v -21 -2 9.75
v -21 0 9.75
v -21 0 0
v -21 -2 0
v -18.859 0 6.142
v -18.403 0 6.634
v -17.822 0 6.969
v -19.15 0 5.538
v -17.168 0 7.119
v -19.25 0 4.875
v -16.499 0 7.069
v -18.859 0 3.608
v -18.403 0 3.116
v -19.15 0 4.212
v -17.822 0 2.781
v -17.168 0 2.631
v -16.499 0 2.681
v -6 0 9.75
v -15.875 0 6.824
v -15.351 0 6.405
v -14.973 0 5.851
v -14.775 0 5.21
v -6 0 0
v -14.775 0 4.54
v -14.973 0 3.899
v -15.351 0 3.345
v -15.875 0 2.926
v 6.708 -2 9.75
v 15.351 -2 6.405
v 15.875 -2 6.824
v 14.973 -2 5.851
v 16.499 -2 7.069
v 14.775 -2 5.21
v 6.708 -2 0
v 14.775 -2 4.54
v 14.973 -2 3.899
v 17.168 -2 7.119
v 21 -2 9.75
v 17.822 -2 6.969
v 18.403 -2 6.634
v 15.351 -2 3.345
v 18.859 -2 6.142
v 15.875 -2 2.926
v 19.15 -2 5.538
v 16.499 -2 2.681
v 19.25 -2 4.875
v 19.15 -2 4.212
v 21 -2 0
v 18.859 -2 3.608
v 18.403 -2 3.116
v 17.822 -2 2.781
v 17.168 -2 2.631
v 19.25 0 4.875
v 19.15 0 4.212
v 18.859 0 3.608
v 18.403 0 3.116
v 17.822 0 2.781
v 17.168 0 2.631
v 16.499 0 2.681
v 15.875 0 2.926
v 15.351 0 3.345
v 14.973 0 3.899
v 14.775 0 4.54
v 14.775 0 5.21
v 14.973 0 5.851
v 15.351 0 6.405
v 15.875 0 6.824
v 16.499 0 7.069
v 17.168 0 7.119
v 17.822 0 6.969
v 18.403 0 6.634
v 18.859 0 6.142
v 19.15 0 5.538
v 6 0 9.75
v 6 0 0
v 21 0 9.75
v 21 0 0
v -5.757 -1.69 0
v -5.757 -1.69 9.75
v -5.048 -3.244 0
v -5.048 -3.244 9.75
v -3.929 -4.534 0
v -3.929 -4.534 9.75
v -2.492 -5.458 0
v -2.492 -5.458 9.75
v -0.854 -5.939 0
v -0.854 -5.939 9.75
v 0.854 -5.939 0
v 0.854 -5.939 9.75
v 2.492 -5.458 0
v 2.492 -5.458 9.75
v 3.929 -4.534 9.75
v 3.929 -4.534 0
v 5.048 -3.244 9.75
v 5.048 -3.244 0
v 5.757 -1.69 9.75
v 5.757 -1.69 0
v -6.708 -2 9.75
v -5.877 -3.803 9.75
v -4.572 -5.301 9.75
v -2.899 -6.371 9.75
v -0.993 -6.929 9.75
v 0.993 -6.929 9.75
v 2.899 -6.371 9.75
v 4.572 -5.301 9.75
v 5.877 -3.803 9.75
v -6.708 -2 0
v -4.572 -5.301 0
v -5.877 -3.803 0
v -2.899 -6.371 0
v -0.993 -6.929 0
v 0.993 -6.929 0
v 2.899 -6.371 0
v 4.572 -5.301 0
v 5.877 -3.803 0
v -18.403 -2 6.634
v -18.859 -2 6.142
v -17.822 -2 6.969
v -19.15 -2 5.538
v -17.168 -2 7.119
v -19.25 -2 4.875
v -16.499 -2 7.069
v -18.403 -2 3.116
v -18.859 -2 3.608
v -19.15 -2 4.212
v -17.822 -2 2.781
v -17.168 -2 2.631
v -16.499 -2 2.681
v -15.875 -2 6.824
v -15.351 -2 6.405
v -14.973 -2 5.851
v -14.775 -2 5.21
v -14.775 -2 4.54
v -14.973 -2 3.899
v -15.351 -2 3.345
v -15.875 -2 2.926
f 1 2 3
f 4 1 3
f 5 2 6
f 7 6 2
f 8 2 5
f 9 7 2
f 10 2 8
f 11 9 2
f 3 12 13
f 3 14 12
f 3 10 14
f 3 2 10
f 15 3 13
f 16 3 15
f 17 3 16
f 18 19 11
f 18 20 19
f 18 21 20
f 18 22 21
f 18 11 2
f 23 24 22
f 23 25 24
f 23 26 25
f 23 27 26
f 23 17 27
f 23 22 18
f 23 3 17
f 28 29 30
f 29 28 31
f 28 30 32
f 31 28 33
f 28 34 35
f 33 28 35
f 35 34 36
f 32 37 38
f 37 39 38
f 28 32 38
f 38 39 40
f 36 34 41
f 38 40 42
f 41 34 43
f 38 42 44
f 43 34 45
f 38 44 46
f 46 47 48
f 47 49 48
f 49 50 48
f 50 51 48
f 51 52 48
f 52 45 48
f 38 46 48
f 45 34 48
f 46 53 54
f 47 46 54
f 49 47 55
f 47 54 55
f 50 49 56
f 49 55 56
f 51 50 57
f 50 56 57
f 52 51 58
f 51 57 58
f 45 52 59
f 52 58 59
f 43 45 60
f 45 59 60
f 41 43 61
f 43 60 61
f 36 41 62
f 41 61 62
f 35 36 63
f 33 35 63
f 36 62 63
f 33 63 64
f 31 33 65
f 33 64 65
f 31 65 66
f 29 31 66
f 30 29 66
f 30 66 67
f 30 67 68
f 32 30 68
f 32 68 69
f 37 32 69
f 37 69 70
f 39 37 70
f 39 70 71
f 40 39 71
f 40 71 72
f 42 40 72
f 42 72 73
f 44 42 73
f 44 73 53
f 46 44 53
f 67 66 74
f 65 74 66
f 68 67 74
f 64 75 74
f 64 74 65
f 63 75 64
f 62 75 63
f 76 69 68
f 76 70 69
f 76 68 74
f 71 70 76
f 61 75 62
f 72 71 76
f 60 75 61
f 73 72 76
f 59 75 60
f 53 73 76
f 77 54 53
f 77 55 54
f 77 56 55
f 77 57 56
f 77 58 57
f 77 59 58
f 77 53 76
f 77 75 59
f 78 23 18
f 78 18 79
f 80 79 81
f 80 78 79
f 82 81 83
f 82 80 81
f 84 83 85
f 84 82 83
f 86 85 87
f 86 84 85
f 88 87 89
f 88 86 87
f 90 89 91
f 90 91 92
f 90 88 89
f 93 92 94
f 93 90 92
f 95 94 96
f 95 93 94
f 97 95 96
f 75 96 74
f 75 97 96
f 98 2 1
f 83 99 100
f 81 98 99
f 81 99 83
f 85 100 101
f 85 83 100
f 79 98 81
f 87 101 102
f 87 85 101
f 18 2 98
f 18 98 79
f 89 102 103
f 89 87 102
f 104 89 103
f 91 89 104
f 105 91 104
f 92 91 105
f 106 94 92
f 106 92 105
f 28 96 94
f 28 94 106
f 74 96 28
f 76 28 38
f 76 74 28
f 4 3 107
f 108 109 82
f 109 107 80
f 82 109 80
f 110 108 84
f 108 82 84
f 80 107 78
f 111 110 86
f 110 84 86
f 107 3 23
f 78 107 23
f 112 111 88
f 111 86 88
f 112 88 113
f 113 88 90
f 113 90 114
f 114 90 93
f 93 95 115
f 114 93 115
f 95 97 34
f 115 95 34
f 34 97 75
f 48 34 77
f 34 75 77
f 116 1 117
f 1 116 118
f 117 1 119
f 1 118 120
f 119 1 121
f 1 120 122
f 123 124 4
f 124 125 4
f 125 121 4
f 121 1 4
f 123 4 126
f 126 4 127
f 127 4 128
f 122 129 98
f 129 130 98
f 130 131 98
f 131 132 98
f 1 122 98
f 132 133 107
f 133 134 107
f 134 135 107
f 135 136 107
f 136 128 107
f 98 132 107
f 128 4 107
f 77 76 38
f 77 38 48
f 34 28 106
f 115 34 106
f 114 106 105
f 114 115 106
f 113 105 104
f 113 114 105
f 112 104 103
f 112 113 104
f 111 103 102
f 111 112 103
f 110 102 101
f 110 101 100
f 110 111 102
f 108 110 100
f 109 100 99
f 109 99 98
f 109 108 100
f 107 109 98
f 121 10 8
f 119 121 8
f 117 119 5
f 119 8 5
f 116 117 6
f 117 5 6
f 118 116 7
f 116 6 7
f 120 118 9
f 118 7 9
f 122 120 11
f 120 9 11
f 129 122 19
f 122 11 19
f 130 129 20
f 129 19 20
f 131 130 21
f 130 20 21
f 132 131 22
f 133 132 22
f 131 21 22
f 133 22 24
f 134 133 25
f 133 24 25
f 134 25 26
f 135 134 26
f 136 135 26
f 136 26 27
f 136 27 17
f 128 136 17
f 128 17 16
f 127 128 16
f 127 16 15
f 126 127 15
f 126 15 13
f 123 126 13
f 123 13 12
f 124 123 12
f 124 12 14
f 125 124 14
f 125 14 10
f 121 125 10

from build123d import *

# Parameters (mm, degrees)
EXTRUDE_THIN1_DEPTH = 9.75
SKETCH3_W           = 15
SKETCH3_H           = 9.75
BOSS_EXTRUDE1_DEPTH = 2
SKETCH4_R           = 2.25
CUT_EXTRUDE1_DEPTH  = 25.188065239


with BuildPart() as part:
    # Sketch1 → Extrude-Thin1 (new body)
    with BuildSketch(Plane.XY):
        with BuildLine():
            ThreePointArc((-6, 0), (0, -6), (6, 0))
            Line((6, 0), (7, 0))
            ThreePointArc((7, 0), (0, -7), (-7, 0))
            Line((-7, 0), (-6, 0))
        make_face()
    extrude(amount=EXTRUDE_THIN1_DEPTH)

    # Sketch3 → Boss-Extrude1 (add)
    with BuildSketch(Plane(origin=(0, 0, 0), x_dir=(1, 0, 0), z_dir=(0, 1, 0))):
        with Locations((-13.5, -4.875)):
            Rectangle(SKETCH3_W, SKETCH3_H)
        with Locations((13.5, -4.875)):
            Rectangle(SKETCH3_W, SKETCH3_H)
    extrude(amount=-BOSS_EXTRUDE1_DEPTH)

    # Sketch4 → Cut-Extrude1 (cut, through all)
    with BuildSketch(Plane(origin=(0, 0, 0), x_dir=(1, 0, 0), z_dir=(0, 1, 0))):
        with Locations(Location((-17, -4.875, 0), (0, 0, 180))):
            Circle(SKETCH4_R)
        with Locations((17, -4.875)):
            Circle(SKETCH4_R)
    extrude(amount=-CUT_EXTRUDE1_DEPTH, mode=Mode.SUBTRACT)


solid = part.part
